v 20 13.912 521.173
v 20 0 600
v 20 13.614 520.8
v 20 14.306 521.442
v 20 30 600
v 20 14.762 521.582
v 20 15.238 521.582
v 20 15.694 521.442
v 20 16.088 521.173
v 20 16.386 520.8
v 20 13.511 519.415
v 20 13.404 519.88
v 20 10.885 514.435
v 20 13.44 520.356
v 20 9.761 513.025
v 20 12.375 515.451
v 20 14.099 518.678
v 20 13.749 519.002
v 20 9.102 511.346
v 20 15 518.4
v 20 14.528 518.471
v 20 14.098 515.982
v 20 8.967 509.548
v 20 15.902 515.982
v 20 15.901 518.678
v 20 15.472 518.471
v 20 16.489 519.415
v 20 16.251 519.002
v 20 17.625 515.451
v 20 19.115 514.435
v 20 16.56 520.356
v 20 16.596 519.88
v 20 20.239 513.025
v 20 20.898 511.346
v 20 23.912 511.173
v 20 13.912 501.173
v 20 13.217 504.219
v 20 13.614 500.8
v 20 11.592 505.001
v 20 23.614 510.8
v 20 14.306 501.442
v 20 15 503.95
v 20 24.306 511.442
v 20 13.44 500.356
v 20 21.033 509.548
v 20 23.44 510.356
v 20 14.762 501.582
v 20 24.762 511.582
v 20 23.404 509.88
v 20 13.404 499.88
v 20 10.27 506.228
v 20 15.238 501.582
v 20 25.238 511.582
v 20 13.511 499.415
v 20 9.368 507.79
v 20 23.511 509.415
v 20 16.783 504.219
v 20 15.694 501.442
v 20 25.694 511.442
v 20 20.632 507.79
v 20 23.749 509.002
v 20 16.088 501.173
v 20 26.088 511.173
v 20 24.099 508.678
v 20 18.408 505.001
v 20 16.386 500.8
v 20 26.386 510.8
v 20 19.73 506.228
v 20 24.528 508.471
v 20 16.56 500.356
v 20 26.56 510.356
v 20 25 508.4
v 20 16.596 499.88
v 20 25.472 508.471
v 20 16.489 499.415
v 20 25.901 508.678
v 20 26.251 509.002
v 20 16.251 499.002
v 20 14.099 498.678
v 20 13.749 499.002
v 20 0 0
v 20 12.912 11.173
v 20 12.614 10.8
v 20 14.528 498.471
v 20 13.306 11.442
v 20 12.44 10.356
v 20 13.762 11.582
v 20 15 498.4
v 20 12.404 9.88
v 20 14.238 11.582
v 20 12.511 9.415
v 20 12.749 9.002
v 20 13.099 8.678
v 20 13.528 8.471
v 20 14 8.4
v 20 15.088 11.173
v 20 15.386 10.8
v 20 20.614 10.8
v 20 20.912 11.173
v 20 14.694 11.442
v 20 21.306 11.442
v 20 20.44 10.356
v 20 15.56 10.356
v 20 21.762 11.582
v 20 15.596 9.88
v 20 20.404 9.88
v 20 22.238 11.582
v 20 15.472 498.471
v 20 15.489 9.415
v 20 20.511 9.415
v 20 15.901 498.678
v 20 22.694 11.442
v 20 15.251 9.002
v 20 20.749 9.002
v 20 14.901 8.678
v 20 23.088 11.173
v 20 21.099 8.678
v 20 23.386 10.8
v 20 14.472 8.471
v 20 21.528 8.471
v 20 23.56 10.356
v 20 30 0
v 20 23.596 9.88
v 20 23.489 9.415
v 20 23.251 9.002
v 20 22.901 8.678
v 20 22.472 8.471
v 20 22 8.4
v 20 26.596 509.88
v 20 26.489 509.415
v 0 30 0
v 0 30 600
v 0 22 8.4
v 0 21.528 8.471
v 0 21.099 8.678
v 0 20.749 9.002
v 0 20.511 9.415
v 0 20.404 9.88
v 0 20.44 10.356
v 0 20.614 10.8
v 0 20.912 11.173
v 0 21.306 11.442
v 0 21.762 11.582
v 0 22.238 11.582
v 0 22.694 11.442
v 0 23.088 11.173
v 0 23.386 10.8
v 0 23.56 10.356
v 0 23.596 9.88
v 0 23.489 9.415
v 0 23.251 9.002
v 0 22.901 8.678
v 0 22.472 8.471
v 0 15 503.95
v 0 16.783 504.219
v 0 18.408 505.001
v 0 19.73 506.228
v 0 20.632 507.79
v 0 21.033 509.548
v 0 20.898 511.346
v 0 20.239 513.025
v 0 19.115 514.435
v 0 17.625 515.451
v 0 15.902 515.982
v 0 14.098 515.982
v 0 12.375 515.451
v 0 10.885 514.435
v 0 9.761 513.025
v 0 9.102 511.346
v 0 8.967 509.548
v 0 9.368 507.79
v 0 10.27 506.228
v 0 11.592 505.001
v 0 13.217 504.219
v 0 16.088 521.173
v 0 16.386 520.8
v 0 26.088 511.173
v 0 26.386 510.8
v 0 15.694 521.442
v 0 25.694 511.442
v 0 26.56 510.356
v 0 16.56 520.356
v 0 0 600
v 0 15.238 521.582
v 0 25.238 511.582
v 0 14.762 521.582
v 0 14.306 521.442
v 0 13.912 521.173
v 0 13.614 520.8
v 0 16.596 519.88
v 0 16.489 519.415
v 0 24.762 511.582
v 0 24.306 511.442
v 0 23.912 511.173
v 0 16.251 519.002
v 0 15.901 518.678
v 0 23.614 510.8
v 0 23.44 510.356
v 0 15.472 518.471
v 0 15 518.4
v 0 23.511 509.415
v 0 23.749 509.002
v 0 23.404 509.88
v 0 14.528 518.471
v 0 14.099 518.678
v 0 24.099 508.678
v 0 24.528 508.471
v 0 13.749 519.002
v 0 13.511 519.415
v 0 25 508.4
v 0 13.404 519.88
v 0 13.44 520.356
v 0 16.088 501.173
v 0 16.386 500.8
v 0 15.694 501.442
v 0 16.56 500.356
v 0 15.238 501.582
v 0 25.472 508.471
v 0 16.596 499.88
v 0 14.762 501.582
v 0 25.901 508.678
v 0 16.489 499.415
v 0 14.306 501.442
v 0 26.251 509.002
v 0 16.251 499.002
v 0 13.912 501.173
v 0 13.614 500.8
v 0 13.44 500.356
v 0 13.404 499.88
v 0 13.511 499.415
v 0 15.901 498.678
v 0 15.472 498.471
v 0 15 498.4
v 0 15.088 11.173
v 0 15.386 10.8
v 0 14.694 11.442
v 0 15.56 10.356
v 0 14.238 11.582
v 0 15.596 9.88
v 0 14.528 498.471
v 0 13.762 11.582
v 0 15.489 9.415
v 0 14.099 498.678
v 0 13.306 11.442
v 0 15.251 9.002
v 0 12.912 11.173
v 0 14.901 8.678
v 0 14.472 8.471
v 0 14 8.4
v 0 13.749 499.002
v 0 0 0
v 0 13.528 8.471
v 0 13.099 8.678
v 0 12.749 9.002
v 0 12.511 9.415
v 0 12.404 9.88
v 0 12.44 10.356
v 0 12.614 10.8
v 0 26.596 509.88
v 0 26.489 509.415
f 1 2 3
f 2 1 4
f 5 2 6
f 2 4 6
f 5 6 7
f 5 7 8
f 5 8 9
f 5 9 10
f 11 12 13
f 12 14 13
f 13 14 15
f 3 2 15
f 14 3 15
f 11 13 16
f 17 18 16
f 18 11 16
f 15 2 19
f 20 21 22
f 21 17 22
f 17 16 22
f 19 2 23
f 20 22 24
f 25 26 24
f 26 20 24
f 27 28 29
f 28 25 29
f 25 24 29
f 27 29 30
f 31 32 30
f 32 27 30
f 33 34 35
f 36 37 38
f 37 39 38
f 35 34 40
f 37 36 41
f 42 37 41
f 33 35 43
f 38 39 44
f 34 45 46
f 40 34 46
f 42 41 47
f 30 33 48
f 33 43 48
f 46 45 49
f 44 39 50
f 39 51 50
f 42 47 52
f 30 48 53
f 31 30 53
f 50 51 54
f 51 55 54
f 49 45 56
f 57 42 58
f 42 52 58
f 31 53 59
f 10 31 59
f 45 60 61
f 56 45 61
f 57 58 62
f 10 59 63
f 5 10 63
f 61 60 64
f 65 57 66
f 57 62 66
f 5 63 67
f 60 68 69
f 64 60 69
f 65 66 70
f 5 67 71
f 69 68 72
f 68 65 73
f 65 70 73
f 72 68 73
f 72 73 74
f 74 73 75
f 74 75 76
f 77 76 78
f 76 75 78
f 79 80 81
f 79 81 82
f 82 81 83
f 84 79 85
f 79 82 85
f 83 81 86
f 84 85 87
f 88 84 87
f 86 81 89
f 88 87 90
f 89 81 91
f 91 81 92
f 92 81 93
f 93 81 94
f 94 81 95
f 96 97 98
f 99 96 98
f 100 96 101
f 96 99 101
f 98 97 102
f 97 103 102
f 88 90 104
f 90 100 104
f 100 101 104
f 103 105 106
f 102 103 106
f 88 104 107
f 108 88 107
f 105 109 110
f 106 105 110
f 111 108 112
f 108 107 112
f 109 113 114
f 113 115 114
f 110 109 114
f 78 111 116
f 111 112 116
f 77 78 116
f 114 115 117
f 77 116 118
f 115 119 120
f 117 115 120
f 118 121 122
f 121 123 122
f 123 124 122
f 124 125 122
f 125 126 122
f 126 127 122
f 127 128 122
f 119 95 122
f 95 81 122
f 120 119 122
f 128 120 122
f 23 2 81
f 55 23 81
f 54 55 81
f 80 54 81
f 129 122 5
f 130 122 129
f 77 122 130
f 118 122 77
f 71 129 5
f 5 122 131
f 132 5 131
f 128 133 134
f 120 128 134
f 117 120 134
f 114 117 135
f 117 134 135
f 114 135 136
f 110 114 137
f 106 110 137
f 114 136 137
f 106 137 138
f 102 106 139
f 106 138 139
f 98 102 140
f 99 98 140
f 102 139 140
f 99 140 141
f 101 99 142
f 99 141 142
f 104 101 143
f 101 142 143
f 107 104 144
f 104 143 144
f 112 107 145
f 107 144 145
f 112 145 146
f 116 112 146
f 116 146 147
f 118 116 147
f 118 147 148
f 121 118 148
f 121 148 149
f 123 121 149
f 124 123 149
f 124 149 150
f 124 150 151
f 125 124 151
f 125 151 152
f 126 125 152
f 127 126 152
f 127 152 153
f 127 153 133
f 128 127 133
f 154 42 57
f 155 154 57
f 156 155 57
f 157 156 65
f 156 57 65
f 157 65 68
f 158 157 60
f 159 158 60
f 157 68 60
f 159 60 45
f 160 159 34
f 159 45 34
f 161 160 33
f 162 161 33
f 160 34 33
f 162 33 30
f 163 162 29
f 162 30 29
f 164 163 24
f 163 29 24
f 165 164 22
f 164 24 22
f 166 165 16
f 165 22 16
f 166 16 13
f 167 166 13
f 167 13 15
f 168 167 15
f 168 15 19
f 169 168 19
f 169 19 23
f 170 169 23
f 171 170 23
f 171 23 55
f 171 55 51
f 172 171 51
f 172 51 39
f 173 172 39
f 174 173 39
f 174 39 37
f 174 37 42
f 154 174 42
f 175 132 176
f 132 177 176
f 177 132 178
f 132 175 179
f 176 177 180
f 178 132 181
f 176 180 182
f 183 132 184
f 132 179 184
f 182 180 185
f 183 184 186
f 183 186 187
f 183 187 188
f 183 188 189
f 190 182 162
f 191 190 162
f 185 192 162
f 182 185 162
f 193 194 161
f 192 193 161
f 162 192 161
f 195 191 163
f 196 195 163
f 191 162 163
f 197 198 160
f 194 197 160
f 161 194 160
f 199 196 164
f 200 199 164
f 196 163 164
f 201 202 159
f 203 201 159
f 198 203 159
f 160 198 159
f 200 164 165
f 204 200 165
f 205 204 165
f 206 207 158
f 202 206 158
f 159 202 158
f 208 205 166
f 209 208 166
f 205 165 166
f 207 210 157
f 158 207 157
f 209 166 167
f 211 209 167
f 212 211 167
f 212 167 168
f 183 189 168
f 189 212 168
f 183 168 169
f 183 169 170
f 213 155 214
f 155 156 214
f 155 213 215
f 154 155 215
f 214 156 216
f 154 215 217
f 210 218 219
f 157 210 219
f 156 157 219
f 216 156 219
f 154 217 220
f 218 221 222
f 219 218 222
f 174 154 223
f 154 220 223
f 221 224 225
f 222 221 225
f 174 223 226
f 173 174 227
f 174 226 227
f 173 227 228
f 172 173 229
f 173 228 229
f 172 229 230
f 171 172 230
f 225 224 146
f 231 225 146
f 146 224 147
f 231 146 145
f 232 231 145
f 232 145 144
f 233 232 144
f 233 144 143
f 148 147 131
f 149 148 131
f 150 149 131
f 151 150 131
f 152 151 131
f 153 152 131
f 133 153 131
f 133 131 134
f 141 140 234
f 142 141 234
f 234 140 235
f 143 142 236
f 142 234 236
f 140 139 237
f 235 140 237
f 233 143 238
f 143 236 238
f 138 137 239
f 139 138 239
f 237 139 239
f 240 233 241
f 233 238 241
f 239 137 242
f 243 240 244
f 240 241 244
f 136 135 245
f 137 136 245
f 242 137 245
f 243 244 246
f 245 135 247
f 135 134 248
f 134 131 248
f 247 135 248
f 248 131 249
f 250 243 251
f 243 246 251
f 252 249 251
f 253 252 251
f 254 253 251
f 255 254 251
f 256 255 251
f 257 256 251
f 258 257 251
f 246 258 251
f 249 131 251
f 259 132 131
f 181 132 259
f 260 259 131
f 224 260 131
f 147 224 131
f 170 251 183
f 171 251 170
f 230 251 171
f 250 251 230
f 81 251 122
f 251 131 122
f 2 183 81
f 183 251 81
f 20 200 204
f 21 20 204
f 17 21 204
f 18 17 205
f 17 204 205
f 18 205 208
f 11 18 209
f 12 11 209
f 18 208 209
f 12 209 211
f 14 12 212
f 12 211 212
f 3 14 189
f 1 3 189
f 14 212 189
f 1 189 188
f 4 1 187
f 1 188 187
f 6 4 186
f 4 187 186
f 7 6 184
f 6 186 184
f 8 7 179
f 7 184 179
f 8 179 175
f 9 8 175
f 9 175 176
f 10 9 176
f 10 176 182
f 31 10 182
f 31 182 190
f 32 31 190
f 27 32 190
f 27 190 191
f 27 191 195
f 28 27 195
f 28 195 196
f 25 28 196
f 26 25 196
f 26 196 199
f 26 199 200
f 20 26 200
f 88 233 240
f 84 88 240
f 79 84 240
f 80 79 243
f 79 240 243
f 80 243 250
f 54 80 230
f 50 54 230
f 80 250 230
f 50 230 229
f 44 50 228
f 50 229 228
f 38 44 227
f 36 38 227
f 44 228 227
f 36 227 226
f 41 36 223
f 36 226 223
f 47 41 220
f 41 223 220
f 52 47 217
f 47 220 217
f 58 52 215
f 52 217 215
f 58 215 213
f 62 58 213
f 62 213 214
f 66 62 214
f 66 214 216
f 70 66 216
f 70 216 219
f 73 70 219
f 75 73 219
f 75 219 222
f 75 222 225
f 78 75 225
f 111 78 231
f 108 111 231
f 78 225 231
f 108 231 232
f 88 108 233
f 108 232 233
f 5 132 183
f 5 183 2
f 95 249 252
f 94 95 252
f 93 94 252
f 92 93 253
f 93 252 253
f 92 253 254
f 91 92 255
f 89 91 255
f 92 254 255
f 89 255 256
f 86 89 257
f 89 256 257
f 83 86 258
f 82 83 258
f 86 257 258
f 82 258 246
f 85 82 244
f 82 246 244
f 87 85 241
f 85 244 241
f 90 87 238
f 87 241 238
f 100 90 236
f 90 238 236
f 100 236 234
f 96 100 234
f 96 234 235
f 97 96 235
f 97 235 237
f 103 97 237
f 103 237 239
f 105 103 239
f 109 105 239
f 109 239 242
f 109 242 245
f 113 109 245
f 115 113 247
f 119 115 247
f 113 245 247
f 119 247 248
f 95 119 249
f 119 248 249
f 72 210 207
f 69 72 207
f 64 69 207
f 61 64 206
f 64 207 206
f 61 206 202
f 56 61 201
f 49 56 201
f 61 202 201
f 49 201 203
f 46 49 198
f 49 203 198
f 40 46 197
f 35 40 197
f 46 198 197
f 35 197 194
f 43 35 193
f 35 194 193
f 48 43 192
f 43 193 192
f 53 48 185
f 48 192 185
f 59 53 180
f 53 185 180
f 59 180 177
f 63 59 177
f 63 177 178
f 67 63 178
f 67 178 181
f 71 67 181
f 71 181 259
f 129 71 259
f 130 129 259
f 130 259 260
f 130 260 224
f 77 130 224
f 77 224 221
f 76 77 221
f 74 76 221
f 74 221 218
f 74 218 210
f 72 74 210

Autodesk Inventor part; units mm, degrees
ref_plane "YZ Plane" through (0, 0, 0) normal (1, 0, 0) x (0, 1, 0)
ref_plane "XZ Plane" through (0, 0, 0) normal (0, 1, 0) x (-1, 0, 0)
ref_plane "XY Plane" through (0, 0, 0) normal (0, 0, 1) x (1, 0, 0)
sketch "スケッチ1" plane through (0, 0, 0) normal (0, 0, 1) x (1, 0, 0)
  line L0 (0, 0) -> (20, 0)
  line L1 (20, 0) -> (20, 30)
  line L2 (20, 30) -> (0, 30)
  line L3 (0, 30) -> (0, 0)
  dimension "d0" = 20
  dimension "d1" = 30
extrude "押し出し1" add sketch "スケッチ1" along normal blind 600
sketch "スケッチ2" plane through (20, 0, 0) normal (1, 0, 0) x (0, 0, -1)
  circle A0 centre (-510, 15) radius 6.05
  line L0 (0, 30) -> (-600, 30) projected
  line L1 (-600, 0) -> (-600, 30) projected
  point P0 (0, 0)
  dimension "d4" = 12.1
  dimension "d5" = 15
  dimension "d6" = 90
extrude "押し出し2" cut sketch "スケッチ2" against normal blind 600
sketch "スケッチ3" plane through (20, 0, 0) normal (1, 0, 0) x (0, 0, -1)
  line L0 (0, 30) -> (-600, 30) projected
  line L1 (0, 0) -> (0, 30) projected
  point P0 (-10, 22)
  point P1 (-10, 14)
  dimension "d9" = 8
  dimension "d10" = 10
  dimension "d11" = 8
  dimension "d12" = 10
hole "穴1" at (20, 22, 10) at (20, 14, 10) direction (-1, 0, 0) diameter 3.2 end through all
sketch "スケッチ5" plane through (20, 0, 0) normal (1, 0, 0) x (0, 0, -1)
  circle A0 centre (-510, 15) radius 6.05 projected
  circle A1 centre (-510, 15) radius 10 construction
  point P0 (0, 0)
  point P1 (-520, 15)
  point P2 (-500, 15)
  point P3 (-510, 25)
  dimension "d30" = 20
hole "穴3" at (20, 15, 520) at (20, 15, 500) at (20, 25, 510) direction (-1, 0, 0) diameter 3.2 end through all
properties part number "射出_腕_真2"
